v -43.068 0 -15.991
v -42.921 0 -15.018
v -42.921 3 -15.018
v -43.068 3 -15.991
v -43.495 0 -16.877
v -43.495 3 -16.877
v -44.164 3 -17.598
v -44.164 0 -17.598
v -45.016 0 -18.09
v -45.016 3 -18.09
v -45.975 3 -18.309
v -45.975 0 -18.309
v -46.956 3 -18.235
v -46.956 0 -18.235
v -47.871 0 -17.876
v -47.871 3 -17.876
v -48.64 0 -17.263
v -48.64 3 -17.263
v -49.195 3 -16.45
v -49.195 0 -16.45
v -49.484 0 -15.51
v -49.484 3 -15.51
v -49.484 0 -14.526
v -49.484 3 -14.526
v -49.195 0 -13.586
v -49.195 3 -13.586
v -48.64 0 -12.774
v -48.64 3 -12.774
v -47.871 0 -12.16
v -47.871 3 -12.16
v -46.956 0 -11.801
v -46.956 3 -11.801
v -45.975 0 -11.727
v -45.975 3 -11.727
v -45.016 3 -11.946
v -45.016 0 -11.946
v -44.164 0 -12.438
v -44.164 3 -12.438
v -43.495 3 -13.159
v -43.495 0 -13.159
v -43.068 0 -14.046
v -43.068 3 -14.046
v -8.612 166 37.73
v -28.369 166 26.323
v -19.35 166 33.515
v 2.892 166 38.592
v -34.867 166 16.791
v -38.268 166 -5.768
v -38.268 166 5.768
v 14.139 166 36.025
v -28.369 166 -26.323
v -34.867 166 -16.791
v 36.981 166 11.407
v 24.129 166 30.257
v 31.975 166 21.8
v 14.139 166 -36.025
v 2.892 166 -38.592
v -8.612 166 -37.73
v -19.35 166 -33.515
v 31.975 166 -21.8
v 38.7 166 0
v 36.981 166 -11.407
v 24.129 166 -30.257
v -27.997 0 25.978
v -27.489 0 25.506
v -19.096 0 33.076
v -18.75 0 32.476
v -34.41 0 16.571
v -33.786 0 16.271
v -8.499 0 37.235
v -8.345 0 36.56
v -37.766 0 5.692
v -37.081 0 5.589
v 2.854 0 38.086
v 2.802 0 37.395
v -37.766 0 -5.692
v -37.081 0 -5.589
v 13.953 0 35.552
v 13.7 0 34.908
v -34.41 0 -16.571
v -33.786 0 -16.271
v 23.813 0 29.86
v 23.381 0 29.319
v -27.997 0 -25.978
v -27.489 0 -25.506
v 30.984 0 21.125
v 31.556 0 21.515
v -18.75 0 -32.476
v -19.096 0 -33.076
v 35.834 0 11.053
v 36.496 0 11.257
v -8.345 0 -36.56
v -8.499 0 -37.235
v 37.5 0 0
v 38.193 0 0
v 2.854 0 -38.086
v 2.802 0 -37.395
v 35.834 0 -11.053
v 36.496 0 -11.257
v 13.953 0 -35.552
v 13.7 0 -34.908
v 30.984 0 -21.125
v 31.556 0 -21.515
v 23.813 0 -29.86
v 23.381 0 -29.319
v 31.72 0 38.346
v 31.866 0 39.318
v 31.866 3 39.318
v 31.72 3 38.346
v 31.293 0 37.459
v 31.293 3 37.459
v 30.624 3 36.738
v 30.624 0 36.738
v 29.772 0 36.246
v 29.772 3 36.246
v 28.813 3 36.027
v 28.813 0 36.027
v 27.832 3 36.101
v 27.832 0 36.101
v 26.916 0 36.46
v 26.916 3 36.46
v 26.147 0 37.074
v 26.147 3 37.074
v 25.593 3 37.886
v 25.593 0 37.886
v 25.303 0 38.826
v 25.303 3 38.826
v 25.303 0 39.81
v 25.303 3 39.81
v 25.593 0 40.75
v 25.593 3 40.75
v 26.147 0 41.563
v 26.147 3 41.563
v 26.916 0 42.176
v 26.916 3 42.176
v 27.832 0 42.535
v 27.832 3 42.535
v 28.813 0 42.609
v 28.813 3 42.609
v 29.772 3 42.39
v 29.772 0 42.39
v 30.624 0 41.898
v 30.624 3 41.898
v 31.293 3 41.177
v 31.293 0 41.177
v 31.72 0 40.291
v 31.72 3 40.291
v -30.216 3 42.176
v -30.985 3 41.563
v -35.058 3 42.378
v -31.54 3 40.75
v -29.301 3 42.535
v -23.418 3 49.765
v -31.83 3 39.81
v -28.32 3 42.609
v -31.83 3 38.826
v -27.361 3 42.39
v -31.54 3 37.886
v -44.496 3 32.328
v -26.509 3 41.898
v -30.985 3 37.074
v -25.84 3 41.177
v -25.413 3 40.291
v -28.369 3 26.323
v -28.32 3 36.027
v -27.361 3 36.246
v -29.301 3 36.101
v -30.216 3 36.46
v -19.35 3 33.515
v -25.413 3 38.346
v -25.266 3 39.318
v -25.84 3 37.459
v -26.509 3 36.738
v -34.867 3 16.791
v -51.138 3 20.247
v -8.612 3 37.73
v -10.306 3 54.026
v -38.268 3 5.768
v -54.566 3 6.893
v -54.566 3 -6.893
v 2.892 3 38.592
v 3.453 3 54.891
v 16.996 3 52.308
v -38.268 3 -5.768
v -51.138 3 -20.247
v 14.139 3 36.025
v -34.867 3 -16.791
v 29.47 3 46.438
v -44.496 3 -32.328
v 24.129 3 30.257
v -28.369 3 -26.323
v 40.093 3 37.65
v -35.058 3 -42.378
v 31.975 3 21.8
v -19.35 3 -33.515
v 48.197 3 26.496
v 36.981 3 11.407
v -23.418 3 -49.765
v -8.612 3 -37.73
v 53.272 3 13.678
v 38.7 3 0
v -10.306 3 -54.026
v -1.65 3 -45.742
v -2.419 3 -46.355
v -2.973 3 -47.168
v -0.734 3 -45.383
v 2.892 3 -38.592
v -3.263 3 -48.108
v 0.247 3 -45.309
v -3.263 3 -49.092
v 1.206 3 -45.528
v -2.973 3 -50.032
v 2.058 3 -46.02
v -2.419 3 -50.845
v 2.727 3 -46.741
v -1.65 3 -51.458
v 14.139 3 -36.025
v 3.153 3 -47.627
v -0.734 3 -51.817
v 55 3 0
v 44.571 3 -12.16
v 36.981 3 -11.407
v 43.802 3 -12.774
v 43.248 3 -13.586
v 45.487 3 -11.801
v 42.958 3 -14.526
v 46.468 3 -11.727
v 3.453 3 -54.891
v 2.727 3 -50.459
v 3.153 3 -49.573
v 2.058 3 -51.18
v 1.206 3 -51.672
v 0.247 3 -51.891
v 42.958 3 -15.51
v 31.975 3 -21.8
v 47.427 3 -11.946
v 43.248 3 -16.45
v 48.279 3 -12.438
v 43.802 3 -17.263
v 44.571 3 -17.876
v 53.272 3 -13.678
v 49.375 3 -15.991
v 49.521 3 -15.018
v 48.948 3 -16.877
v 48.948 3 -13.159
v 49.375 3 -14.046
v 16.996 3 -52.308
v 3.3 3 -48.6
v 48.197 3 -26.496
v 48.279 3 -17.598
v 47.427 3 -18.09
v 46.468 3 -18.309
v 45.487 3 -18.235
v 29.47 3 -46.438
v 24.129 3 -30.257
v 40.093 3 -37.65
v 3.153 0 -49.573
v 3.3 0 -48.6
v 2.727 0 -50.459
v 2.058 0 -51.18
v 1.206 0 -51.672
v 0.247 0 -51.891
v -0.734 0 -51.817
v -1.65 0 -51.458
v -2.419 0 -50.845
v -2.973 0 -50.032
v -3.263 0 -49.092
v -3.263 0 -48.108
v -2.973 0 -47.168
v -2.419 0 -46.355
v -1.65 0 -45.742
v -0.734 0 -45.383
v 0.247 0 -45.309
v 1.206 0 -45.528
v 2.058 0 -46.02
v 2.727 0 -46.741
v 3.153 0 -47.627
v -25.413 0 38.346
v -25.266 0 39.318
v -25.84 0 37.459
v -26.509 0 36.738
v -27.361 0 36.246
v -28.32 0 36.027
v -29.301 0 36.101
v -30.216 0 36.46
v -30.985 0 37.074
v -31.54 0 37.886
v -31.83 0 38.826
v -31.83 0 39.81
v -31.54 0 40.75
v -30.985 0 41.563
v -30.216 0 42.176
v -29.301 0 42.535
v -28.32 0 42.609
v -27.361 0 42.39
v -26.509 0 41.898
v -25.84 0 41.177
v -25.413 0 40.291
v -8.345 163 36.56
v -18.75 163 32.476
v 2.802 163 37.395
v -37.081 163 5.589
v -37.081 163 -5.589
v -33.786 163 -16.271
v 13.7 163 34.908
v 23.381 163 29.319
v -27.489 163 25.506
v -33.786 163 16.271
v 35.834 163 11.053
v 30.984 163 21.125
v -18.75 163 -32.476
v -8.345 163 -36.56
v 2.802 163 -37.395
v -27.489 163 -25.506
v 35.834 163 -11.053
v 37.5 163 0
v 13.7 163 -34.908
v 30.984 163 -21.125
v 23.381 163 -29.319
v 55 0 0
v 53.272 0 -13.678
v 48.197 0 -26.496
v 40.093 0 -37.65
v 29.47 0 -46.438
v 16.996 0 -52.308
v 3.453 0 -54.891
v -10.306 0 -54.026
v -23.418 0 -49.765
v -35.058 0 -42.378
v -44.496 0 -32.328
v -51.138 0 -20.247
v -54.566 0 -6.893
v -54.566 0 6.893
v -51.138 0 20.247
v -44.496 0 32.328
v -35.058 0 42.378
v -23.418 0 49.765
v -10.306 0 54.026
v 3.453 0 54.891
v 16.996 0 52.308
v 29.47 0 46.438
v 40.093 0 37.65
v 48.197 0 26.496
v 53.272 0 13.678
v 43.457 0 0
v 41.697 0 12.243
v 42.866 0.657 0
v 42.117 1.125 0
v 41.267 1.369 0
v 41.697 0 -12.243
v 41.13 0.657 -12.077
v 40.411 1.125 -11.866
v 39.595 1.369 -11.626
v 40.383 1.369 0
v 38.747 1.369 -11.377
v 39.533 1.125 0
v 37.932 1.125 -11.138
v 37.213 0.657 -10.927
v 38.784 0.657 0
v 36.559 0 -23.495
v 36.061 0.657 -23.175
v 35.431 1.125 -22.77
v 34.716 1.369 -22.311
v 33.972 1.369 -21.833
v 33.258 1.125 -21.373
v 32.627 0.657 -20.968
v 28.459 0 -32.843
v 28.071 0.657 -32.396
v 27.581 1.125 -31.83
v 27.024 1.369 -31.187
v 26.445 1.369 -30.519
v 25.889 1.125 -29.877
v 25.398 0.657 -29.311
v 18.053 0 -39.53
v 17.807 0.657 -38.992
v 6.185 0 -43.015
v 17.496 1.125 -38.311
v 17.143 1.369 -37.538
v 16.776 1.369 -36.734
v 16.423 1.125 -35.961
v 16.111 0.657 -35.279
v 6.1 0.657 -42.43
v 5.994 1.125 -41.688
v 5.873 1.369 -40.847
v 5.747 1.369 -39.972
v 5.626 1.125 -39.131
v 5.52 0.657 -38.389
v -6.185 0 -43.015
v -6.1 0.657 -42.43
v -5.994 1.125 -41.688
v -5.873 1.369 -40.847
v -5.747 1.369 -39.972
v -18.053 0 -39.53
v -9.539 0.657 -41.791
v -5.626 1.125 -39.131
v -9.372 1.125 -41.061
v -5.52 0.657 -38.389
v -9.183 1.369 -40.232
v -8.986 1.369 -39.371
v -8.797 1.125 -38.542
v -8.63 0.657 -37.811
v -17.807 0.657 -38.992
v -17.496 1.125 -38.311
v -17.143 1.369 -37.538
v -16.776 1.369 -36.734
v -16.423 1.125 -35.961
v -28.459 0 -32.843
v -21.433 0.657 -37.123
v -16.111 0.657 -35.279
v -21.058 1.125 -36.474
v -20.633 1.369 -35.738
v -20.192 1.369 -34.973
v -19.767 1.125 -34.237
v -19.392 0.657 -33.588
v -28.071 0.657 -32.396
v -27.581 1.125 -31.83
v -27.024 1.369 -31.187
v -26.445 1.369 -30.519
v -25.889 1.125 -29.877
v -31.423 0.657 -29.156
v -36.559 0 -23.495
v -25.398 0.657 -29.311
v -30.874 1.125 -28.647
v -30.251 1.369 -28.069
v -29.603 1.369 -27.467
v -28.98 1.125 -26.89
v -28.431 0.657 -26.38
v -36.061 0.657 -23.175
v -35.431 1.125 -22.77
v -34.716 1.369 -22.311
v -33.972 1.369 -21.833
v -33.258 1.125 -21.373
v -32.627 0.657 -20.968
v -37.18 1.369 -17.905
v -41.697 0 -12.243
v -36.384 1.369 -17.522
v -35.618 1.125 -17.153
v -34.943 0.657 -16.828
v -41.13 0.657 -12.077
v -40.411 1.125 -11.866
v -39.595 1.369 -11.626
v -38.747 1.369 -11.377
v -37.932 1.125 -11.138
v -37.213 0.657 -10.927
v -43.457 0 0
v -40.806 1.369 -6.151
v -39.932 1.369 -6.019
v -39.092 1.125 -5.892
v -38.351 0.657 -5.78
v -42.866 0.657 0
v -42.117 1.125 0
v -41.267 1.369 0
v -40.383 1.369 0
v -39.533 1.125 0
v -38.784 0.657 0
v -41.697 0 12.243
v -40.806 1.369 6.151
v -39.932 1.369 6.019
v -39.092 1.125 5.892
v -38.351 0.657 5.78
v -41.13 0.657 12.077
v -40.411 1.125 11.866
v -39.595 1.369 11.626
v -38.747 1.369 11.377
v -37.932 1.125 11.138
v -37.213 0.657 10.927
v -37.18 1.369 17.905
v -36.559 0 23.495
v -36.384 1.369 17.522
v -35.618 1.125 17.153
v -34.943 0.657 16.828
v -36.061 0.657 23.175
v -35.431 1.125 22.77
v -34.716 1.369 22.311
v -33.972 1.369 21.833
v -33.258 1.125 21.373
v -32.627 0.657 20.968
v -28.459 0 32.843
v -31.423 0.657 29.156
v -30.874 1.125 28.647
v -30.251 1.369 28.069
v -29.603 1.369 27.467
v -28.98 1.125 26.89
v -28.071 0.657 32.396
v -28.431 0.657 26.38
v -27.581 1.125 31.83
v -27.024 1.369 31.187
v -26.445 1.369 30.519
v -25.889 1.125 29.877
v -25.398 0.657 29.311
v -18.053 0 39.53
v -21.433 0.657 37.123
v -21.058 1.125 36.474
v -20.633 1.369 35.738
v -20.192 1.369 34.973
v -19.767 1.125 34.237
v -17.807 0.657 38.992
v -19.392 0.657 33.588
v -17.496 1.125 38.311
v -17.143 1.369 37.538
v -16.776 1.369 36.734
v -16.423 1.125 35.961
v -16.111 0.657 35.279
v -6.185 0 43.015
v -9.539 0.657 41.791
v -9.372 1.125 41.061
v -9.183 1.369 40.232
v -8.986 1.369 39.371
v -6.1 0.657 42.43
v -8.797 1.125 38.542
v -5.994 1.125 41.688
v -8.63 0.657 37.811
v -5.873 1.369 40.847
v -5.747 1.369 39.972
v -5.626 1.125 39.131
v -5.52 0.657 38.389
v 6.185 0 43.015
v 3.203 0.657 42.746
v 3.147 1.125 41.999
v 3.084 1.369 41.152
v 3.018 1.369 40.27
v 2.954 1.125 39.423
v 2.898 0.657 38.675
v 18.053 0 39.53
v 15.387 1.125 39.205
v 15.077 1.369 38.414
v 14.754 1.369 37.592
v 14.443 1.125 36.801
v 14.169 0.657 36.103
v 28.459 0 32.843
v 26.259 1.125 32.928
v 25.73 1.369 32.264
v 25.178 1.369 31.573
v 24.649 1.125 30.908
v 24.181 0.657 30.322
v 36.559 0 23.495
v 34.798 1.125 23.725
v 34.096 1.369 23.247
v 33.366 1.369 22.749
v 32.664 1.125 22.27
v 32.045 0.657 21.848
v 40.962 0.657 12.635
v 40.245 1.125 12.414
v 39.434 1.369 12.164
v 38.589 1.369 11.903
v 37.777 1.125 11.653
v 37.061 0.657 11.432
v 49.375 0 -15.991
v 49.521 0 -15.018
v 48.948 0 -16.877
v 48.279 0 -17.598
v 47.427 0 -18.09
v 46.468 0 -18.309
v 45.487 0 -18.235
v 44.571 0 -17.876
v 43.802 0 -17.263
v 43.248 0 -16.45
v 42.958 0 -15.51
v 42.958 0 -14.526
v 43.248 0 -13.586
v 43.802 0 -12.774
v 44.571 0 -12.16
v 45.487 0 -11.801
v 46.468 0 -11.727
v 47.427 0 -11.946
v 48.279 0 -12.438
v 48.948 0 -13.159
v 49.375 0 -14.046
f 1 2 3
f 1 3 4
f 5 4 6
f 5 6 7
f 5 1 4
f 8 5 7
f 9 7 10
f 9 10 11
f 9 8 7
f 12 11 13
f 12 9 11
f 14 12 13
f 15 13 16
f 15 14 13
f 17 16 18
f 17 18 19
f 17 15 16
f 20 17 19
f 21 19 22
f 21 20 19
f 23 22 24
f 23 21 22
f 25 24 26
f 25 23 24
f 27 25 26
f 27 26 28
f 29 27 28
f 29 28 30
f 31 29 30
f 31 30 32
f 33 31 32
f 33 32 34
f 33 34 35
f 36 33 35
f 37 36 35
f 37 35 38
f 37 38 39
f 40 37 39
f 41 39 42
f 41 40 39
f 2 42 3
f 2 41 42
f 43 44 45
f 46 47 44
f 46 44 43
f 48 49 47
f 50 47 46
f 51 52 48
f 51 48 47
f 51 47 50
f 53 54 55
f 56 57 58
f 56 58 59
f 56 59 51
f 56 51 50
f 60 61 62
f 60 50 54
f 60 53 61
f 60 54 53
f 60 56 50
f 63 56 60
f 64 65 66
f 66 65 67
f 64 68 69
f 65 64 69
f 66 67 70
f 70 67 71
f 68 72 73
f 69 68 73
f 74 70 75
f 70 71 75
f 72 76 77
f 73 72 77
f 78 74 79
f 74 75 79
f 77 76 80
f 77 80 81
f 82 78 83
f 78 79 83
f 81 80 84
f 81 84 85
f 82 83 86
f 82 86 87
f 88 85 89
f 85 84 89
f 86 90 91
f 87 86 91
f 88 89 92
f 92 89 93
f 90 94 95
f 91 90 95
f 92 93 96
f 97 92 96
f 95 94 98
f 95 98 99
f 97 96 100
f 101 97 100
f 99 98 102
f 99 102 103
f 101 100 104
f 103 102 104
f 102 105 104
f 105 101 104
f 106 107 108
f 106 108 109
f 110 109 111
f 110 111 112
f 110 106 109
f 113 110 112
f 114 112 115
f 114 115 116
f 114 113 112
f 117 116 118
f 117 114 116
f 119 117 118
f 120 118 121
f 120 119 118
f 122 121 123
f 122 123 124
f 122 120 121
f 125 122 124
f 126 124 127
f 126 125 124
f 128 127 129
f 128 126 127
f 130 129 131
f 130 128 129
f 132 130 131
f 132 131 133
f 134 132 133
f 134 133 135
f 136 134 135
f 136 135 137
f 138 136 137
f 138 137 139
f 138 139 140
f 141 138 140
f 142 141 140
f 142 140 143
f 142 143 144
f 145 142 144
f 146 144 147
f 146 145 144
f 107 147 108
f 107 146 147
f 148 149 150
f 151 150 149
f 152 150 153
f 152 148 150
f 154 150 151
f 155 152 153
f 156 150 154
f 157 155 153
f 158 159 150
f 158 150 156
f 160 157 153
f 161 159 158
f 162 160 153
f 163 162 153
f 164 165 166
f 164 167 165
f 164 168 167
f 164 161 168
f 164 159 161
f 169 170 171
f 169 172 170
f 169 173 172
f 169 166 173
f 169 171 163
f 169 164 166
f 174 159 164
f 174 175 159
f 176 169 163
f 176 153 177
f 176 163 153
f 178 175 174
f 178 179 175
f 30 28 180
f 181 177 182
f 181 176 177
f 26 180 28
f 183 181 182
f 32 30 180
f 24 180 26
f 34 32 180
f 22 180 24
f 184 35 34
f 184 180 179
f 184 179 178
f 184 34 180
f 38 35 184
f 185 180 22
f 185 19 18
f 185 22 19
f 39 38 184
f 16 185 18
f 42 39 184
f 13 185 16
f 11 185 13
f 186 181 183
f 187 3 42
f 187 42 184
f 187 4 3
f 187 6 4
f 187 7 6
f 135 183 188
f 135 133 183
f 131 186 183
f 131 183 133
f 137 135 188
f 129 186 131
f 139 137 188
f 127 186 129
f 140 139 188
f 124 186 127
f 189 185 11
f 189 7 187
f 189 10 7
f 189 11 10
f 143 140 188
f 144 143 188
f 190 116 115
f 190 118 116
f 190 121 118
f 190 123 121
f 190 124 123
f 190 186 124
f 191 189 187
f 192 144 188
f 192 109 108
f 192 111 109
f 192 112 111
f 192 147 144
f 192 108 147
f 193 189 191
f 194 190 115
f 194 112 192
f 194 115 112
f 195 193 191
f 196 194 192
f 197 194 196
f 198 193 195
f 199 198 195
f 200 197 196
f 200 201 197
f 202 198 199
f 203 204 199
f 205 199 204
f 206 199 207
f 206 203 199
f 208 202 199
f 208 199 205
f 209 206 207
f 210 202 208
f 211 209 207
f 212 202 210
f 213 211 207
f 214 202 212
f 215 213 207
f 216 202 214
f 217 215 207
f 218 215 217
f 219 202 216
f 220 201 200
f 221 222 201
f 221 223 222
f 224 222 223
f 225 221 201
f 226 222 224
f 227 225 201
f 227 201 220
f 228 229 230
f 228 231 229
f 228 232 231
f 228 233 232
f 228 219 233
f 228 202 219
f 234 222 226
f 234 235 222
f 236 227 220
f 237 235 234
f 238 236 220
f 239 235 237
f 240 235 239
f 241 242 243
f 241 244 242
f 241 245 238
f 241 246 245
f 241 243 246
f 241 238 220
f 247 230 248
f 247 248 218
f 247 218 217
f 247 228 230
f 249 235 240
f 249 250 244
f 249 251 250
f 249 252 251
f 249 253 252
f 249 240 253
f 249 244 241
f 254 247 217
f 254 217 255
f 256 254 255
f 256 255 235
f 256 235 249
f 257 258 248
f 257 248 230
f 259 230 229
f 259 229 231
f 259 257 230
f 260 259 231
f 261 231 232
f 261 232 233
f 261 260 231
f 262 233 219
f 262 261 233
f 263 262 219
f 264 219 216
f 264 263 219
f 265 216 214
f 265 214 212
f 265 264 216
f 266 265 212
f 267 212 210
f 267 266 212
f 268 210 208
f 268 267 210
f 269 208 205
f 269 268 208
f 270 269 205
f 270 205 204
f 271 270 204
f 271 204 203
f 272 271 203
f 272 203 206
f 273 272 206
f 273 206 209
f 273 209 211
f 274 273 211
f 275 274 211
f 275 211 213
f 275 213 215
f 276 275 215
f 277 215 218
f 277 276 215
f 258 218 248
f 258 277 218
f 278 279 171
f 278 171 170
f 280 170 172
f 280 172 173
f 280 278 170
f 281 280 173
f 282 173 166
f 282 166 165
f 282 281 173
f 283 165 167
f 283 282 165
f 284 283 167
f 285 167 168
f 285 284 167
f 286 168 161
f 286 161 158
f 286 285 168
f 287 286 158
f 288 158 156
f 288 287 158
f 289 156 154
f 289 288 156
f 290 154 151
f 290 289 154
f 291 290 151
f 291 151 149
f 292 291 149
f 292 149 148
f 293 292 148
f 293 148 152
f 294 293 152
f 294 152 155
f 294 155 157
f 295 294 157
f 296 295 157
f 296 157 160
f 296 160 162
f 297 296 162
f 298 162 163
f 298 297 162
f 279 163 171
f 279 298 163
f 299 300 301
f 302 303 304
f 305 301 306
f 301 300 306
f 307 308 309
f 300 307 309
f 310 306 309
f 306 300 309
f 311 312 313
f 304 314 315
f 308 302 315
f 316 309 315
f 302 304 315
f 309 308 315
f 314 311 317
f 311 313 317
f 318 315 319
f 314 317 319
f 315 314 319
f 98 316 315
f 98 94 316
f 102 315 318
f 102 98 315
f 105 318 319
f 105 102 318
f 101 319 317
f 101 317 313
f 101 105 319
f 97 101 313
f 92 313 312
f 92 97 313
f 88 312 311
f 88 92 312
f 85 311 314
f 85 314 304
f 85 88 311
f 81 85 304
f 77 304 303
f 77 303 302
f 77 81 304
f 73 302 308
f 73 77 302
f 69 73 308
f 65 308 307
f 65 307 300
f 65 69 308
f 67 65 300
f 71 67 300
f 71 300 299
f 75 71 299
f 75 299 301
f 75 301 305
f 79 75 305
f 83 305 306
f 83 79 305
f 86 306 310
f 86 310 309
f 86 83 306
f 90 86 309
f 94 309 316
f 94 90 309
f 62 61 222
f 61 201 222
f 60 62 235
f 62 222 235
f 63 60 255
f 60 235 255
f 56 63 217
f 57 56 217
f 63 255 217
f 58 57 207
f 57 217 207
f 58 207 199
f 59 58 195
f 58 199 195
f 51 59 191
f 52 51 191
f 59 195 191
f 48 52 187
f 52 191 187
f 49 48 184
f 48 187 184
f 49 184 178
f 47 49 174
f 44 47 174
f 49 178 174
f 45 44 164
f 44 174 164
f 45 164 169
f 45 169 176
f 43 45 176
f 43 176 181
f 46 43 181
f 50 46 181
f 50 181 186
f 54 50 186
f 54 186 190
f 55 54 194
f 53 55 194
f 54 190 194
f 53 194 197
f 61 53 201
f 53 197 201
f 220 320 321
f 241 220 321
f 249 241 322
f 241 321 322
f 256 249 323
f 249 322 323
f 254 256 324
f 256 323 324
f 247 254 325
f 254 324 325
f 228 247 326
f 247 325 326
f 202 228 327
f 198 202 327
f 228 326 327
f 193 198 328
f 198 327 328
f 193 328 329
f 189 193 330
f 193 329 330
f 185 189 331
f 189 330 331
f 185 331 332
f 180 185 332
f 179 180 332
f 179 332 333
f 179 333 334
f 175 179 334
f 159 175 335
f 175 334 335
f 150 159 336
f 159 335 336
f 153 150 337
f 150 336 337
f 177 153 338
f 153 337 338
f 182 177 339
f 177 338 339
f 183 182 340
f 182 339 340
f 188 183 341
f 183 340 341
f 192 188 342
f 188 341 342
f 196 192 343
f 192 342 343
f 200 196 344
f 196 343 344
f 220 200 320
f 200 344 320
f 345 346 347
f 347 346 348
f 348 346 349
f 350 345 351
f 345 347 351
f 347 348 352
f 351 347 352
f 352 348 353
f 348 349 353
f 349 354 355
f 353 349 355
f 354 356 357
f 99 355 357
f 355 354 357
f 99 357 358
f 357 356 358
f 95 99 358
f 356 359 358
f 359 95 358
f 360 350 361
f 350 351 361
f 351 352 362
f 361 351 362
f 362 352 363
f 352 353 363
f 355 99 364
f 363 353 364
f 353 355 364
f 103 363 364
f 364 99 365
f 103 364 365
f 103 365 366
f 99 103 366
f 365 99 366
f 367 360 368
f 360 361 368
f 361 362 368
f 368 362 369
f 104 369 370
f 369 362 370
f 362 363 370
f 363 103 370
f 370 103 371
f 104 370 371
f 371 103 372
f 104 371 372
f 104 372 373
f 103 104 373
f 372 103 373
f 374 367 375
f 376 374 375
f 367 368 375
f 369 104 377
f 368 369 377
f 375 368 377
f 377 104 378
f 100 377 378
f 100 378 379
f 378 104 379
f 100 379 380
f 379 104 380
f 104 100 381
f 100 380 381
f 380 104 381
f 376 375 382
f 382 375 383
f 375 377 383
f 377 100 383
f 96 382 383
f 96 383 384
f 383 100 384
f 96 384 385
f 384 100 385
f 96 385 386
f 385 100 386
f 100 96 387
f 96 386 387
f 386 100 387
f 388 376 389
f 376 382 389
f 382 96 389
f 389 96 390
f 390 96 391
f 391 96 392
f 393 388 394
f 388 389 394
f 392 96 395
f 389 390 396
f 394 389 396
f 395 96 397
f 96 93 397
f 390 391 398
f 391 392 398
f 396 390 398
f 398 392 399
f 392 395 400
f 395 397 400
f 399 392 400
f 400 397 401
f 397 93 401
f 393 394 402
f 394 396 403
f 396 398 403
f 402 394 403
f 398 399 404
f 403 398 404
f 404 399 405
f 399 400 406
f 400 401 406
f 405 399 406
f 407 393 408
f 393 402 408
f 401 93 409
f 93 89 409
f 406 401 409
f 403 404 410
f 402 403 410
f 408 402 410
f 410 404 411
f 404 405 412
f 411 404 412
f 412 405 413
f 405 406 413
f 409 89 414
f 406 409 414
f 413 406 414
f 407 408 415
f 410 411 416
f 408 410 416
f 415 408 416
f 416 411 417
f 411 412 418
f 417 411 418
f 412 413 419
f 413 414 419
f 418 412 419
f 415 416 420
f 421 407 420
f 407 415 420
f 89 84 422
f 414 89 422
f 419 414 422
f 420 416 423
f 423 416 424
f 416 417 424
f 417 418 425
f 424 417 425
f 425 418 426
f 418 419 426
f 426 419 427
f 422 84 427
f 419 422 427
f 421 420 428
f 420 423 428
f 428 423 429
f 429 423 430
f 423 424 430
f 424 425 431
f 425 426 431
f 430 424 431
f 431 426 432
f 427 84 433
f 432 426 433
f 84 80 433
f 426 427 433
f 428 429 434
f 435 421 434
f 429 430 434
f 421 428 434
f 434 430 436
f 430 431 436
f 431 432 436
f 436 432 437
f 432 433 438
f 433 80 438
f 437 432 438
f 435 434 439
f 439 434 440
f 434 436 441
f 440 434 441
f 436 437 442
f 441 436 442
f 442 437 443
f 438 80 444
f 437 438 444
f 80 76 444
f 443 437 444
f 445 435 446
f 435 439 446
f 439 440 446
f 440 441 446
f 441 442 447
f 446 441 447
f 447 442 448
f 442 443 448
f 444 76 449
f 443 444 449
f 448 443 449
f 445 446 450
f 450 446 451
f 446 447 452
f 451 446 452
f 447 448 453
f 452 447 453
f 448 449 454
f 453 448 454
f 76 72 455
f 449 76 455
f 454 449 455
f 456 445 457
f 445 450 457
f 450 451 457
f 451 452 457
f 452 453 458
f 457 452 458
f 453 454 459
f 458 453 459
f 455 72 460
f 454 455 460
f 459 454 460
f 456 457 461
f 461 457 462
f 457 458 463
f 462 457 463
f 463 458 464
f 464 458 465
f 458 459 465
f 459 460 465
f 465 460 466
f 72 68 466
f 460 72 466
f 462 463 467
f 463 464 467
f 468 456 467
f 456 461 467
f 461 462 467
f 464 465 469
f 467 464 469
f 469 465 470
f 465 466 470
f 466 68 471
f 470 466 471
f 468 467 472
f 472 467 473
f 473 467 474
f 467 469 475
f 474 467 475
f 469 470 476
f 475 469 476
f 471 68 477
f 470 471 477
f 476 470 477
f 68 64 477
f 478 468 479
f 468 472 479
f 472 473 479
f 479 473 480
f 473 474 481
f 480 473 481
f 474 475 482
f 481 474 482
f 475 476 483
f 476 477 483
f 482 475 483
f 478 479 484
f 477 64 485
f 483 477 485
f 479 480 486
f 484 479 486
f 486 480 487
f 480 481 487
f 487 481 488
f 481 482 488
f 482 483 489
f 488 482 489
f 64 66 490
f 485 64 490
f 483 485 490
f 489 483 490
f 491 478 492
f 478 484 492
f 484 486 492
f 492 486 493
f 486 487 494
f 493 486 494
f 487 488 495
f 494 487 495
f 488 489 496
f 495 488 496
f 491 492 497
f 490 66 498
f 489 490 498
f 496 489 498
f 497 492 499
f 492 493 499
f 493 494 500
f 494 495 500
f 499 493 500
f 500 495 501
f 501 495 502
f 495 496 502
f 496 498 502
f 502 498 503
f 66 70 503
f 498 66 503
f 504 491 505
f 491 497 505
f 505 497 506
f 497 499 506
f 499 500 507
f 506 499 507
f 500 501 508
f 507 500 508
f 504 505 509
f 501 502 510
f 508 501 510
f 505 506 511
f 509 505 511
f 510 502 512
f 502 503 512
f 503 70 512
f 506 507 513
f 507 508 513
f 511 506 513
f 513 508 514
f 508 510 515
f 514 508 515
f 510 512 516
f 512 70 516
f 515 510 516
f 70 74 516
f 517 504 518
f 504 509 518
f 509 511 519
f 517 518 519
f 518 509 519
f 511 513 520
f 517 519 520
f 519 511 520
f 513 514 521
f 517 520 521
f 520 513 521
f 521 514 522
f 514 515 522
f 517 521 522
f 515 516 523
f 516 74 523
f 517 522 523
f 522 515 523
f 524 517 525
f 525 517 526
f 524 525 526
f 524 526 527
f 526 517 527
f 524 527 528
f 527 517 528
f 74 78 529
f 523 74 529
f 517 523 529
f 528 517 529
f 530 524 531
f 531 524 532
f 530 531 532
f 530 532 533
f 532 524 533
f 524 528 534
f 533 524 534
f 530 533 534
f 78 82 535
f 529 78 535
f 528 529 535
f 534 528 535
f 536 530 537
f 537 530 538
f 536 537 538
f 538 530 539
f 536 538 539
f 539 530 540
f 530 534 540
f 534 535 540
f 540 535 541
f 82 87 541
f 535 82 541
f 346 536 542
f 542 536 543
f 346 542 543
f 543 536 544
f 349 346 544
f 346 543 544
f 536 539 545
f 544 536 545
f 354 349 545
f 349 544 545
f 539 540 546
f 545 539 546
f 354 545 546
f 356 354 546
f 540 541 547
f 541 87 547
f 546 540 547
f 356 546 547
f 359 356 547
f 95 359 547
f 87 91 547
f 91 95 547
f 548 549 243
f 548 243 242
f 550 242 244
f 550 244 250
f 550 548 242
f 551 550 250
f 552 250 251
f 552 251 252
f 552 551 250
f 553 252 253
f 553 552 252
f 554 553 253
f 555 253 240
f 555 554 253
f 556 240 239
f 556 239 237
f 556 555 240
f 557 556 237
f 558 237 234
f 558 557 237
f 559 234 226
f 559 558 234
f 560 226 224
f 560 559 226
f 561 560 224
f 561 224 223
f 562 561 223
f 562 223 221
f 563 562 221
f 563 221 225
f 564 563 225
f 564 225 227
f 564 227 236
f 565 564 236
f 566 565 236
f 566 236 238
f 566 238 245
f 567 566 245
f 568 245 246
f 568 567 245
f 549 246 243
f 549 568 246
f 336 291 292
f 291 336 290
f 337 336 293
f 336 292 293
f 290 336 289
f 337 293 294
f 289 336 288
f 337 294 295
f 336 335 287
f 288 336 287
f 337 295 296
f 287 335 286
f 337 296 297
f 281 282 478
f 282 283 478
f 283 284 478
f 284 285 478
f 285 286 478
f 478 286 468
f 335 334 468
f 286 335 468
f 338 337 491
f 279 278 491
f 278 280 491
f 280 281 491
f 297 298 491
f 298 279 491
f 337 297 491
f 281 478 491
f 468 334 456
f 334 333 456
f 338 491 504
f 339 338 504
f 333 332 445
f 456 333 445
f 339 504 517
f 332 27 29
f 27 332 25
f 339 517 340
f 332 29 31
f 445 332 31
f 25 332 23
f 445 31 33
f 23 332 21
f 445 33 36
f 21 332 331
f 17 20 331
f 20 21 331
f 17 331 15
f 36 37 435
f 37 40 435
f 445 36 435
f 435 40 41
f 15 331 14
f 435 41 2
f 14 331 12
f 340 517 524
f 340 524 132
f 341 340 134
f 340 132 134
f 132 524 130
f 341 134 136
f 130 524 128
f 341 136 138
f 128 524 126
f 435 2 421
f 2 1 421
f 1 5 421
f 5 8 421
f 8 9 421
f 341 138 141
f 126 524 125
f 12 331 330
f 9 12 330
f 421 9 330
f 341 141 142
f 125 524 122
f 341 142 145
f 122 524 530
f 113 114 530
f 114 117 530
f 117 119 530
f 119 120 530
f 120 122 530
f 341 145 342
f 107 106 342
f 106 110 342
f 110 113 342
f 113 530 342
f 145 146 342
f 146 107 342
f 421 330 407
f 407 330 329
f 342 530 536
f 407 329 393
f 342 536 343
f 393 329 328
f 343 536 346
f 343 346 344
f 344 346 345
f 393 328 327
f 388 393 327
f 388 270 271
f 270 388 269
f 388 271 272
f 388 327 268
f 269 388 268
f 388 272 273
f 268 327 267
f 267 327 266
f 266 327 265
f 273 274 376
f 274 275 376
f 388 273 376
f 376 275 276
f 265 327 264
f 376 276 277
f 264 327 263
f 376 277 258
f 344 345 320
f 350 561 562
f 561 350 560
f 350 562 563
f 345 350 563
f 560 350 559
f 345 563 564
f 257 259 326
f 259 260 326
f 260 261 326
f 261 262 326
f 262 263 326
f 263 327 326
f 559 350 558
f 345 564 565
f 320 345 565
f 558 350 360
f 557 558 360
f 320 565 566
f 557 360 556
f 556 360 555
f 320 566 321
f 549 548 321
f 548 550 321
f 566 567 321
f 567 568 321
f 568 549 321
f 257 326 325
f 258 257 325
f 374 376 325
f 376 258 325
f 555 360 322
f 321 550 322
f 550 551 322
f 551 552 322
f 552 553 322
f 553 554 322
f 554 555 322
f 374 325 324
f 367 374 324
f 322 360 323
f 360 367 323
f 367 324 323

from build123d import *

# Parameters (mm, degrees)
SKETCH1_R           = 55
SKETCH1_R_2         = 37.5
SKETCH1_R_3         = 3.3
BOSS_EXTRUDE1_DEPTH = 3
SKETCH2_R           = 3.175
SKETCH3_R           = 38.7
SKETCH3_R_2         = 37.5
BOSS_EXTRUDE2_DEPTH = 160
SKETCH4_R           = 38.7
BOSS_EXTRUDE3_DEPTH = 3


with BuildPart() as part:
    # Sketch1 → Boss-Extrude1 (new body)
    with BuildSketch(Plane(origin=(0, 0, 0), x_dir=(1, 0, 0), z_dir=(0, 1, 0))):
        Circle(SKETCH1_R)
        Circle(SKETCH1_R_2, mode=Mode.SUBTRACT)
        with Locations((0, 48.6)):
            Circle(SKETCH1_R_3, mode=Mode.SUBTRACT)
        with Locations((46.221346692, 15.018225927)):
            Circle(SKETCH1_R_3, mode=Mode.SUBTRACT)
        with Locations((28.566363261, -39.318225927)):
            Circle(SKETCH1_R_3, mode=Mode.SUBTRACT)
        with Locations((-28.566363261, -39.318225927)):
            Circle(SKETCH1_R_3, mode=Mode.SUBTRACT)
        with Locations((-46.221346692, 15.018225927)):
            Circle(SKETCH1_R_3, mode=Mode.SUBTRACT)
    extrude(amount=BOSS_EXTRUDE1_DEPTH)

    # Sketch2 → Cut-Revolve1 (revolve, cut)
    with BuildSketch(Plane.XY):
        with Locations((40.825, -1.775)):
            Circle(SKETCH2_R)
    revolve(axis=Axis((0, 0, 0), (0, 1, 0)), mode=Mode.SUBTRACT)

    # Sketch3 → Boss-Extrude2 (add)
    with BuildSketch(Plane(origin=(0, 3, 0), x_dir=(1, 0, 0), z_dir=(0, 1, 0))):
        Circle(SKETCH3_R)
        Circle(SKETCH3_R_2, mode=Mode.SUBTRACT)
    extrude(amount=BOSS_EXTRUDE2_DEPTH)

    # Sketch4 → Boss-Extrude3 (add)
    with BuildSketch(Plane(origin=(0, 163, 0), x_dir=(1, 0, 0), z_dir=(0, 1, 0))):
        Circle(SKETCH4_R)
    extrude(amount=BOSS_EXTRUDE3_DEPTH)


solid = part.part
